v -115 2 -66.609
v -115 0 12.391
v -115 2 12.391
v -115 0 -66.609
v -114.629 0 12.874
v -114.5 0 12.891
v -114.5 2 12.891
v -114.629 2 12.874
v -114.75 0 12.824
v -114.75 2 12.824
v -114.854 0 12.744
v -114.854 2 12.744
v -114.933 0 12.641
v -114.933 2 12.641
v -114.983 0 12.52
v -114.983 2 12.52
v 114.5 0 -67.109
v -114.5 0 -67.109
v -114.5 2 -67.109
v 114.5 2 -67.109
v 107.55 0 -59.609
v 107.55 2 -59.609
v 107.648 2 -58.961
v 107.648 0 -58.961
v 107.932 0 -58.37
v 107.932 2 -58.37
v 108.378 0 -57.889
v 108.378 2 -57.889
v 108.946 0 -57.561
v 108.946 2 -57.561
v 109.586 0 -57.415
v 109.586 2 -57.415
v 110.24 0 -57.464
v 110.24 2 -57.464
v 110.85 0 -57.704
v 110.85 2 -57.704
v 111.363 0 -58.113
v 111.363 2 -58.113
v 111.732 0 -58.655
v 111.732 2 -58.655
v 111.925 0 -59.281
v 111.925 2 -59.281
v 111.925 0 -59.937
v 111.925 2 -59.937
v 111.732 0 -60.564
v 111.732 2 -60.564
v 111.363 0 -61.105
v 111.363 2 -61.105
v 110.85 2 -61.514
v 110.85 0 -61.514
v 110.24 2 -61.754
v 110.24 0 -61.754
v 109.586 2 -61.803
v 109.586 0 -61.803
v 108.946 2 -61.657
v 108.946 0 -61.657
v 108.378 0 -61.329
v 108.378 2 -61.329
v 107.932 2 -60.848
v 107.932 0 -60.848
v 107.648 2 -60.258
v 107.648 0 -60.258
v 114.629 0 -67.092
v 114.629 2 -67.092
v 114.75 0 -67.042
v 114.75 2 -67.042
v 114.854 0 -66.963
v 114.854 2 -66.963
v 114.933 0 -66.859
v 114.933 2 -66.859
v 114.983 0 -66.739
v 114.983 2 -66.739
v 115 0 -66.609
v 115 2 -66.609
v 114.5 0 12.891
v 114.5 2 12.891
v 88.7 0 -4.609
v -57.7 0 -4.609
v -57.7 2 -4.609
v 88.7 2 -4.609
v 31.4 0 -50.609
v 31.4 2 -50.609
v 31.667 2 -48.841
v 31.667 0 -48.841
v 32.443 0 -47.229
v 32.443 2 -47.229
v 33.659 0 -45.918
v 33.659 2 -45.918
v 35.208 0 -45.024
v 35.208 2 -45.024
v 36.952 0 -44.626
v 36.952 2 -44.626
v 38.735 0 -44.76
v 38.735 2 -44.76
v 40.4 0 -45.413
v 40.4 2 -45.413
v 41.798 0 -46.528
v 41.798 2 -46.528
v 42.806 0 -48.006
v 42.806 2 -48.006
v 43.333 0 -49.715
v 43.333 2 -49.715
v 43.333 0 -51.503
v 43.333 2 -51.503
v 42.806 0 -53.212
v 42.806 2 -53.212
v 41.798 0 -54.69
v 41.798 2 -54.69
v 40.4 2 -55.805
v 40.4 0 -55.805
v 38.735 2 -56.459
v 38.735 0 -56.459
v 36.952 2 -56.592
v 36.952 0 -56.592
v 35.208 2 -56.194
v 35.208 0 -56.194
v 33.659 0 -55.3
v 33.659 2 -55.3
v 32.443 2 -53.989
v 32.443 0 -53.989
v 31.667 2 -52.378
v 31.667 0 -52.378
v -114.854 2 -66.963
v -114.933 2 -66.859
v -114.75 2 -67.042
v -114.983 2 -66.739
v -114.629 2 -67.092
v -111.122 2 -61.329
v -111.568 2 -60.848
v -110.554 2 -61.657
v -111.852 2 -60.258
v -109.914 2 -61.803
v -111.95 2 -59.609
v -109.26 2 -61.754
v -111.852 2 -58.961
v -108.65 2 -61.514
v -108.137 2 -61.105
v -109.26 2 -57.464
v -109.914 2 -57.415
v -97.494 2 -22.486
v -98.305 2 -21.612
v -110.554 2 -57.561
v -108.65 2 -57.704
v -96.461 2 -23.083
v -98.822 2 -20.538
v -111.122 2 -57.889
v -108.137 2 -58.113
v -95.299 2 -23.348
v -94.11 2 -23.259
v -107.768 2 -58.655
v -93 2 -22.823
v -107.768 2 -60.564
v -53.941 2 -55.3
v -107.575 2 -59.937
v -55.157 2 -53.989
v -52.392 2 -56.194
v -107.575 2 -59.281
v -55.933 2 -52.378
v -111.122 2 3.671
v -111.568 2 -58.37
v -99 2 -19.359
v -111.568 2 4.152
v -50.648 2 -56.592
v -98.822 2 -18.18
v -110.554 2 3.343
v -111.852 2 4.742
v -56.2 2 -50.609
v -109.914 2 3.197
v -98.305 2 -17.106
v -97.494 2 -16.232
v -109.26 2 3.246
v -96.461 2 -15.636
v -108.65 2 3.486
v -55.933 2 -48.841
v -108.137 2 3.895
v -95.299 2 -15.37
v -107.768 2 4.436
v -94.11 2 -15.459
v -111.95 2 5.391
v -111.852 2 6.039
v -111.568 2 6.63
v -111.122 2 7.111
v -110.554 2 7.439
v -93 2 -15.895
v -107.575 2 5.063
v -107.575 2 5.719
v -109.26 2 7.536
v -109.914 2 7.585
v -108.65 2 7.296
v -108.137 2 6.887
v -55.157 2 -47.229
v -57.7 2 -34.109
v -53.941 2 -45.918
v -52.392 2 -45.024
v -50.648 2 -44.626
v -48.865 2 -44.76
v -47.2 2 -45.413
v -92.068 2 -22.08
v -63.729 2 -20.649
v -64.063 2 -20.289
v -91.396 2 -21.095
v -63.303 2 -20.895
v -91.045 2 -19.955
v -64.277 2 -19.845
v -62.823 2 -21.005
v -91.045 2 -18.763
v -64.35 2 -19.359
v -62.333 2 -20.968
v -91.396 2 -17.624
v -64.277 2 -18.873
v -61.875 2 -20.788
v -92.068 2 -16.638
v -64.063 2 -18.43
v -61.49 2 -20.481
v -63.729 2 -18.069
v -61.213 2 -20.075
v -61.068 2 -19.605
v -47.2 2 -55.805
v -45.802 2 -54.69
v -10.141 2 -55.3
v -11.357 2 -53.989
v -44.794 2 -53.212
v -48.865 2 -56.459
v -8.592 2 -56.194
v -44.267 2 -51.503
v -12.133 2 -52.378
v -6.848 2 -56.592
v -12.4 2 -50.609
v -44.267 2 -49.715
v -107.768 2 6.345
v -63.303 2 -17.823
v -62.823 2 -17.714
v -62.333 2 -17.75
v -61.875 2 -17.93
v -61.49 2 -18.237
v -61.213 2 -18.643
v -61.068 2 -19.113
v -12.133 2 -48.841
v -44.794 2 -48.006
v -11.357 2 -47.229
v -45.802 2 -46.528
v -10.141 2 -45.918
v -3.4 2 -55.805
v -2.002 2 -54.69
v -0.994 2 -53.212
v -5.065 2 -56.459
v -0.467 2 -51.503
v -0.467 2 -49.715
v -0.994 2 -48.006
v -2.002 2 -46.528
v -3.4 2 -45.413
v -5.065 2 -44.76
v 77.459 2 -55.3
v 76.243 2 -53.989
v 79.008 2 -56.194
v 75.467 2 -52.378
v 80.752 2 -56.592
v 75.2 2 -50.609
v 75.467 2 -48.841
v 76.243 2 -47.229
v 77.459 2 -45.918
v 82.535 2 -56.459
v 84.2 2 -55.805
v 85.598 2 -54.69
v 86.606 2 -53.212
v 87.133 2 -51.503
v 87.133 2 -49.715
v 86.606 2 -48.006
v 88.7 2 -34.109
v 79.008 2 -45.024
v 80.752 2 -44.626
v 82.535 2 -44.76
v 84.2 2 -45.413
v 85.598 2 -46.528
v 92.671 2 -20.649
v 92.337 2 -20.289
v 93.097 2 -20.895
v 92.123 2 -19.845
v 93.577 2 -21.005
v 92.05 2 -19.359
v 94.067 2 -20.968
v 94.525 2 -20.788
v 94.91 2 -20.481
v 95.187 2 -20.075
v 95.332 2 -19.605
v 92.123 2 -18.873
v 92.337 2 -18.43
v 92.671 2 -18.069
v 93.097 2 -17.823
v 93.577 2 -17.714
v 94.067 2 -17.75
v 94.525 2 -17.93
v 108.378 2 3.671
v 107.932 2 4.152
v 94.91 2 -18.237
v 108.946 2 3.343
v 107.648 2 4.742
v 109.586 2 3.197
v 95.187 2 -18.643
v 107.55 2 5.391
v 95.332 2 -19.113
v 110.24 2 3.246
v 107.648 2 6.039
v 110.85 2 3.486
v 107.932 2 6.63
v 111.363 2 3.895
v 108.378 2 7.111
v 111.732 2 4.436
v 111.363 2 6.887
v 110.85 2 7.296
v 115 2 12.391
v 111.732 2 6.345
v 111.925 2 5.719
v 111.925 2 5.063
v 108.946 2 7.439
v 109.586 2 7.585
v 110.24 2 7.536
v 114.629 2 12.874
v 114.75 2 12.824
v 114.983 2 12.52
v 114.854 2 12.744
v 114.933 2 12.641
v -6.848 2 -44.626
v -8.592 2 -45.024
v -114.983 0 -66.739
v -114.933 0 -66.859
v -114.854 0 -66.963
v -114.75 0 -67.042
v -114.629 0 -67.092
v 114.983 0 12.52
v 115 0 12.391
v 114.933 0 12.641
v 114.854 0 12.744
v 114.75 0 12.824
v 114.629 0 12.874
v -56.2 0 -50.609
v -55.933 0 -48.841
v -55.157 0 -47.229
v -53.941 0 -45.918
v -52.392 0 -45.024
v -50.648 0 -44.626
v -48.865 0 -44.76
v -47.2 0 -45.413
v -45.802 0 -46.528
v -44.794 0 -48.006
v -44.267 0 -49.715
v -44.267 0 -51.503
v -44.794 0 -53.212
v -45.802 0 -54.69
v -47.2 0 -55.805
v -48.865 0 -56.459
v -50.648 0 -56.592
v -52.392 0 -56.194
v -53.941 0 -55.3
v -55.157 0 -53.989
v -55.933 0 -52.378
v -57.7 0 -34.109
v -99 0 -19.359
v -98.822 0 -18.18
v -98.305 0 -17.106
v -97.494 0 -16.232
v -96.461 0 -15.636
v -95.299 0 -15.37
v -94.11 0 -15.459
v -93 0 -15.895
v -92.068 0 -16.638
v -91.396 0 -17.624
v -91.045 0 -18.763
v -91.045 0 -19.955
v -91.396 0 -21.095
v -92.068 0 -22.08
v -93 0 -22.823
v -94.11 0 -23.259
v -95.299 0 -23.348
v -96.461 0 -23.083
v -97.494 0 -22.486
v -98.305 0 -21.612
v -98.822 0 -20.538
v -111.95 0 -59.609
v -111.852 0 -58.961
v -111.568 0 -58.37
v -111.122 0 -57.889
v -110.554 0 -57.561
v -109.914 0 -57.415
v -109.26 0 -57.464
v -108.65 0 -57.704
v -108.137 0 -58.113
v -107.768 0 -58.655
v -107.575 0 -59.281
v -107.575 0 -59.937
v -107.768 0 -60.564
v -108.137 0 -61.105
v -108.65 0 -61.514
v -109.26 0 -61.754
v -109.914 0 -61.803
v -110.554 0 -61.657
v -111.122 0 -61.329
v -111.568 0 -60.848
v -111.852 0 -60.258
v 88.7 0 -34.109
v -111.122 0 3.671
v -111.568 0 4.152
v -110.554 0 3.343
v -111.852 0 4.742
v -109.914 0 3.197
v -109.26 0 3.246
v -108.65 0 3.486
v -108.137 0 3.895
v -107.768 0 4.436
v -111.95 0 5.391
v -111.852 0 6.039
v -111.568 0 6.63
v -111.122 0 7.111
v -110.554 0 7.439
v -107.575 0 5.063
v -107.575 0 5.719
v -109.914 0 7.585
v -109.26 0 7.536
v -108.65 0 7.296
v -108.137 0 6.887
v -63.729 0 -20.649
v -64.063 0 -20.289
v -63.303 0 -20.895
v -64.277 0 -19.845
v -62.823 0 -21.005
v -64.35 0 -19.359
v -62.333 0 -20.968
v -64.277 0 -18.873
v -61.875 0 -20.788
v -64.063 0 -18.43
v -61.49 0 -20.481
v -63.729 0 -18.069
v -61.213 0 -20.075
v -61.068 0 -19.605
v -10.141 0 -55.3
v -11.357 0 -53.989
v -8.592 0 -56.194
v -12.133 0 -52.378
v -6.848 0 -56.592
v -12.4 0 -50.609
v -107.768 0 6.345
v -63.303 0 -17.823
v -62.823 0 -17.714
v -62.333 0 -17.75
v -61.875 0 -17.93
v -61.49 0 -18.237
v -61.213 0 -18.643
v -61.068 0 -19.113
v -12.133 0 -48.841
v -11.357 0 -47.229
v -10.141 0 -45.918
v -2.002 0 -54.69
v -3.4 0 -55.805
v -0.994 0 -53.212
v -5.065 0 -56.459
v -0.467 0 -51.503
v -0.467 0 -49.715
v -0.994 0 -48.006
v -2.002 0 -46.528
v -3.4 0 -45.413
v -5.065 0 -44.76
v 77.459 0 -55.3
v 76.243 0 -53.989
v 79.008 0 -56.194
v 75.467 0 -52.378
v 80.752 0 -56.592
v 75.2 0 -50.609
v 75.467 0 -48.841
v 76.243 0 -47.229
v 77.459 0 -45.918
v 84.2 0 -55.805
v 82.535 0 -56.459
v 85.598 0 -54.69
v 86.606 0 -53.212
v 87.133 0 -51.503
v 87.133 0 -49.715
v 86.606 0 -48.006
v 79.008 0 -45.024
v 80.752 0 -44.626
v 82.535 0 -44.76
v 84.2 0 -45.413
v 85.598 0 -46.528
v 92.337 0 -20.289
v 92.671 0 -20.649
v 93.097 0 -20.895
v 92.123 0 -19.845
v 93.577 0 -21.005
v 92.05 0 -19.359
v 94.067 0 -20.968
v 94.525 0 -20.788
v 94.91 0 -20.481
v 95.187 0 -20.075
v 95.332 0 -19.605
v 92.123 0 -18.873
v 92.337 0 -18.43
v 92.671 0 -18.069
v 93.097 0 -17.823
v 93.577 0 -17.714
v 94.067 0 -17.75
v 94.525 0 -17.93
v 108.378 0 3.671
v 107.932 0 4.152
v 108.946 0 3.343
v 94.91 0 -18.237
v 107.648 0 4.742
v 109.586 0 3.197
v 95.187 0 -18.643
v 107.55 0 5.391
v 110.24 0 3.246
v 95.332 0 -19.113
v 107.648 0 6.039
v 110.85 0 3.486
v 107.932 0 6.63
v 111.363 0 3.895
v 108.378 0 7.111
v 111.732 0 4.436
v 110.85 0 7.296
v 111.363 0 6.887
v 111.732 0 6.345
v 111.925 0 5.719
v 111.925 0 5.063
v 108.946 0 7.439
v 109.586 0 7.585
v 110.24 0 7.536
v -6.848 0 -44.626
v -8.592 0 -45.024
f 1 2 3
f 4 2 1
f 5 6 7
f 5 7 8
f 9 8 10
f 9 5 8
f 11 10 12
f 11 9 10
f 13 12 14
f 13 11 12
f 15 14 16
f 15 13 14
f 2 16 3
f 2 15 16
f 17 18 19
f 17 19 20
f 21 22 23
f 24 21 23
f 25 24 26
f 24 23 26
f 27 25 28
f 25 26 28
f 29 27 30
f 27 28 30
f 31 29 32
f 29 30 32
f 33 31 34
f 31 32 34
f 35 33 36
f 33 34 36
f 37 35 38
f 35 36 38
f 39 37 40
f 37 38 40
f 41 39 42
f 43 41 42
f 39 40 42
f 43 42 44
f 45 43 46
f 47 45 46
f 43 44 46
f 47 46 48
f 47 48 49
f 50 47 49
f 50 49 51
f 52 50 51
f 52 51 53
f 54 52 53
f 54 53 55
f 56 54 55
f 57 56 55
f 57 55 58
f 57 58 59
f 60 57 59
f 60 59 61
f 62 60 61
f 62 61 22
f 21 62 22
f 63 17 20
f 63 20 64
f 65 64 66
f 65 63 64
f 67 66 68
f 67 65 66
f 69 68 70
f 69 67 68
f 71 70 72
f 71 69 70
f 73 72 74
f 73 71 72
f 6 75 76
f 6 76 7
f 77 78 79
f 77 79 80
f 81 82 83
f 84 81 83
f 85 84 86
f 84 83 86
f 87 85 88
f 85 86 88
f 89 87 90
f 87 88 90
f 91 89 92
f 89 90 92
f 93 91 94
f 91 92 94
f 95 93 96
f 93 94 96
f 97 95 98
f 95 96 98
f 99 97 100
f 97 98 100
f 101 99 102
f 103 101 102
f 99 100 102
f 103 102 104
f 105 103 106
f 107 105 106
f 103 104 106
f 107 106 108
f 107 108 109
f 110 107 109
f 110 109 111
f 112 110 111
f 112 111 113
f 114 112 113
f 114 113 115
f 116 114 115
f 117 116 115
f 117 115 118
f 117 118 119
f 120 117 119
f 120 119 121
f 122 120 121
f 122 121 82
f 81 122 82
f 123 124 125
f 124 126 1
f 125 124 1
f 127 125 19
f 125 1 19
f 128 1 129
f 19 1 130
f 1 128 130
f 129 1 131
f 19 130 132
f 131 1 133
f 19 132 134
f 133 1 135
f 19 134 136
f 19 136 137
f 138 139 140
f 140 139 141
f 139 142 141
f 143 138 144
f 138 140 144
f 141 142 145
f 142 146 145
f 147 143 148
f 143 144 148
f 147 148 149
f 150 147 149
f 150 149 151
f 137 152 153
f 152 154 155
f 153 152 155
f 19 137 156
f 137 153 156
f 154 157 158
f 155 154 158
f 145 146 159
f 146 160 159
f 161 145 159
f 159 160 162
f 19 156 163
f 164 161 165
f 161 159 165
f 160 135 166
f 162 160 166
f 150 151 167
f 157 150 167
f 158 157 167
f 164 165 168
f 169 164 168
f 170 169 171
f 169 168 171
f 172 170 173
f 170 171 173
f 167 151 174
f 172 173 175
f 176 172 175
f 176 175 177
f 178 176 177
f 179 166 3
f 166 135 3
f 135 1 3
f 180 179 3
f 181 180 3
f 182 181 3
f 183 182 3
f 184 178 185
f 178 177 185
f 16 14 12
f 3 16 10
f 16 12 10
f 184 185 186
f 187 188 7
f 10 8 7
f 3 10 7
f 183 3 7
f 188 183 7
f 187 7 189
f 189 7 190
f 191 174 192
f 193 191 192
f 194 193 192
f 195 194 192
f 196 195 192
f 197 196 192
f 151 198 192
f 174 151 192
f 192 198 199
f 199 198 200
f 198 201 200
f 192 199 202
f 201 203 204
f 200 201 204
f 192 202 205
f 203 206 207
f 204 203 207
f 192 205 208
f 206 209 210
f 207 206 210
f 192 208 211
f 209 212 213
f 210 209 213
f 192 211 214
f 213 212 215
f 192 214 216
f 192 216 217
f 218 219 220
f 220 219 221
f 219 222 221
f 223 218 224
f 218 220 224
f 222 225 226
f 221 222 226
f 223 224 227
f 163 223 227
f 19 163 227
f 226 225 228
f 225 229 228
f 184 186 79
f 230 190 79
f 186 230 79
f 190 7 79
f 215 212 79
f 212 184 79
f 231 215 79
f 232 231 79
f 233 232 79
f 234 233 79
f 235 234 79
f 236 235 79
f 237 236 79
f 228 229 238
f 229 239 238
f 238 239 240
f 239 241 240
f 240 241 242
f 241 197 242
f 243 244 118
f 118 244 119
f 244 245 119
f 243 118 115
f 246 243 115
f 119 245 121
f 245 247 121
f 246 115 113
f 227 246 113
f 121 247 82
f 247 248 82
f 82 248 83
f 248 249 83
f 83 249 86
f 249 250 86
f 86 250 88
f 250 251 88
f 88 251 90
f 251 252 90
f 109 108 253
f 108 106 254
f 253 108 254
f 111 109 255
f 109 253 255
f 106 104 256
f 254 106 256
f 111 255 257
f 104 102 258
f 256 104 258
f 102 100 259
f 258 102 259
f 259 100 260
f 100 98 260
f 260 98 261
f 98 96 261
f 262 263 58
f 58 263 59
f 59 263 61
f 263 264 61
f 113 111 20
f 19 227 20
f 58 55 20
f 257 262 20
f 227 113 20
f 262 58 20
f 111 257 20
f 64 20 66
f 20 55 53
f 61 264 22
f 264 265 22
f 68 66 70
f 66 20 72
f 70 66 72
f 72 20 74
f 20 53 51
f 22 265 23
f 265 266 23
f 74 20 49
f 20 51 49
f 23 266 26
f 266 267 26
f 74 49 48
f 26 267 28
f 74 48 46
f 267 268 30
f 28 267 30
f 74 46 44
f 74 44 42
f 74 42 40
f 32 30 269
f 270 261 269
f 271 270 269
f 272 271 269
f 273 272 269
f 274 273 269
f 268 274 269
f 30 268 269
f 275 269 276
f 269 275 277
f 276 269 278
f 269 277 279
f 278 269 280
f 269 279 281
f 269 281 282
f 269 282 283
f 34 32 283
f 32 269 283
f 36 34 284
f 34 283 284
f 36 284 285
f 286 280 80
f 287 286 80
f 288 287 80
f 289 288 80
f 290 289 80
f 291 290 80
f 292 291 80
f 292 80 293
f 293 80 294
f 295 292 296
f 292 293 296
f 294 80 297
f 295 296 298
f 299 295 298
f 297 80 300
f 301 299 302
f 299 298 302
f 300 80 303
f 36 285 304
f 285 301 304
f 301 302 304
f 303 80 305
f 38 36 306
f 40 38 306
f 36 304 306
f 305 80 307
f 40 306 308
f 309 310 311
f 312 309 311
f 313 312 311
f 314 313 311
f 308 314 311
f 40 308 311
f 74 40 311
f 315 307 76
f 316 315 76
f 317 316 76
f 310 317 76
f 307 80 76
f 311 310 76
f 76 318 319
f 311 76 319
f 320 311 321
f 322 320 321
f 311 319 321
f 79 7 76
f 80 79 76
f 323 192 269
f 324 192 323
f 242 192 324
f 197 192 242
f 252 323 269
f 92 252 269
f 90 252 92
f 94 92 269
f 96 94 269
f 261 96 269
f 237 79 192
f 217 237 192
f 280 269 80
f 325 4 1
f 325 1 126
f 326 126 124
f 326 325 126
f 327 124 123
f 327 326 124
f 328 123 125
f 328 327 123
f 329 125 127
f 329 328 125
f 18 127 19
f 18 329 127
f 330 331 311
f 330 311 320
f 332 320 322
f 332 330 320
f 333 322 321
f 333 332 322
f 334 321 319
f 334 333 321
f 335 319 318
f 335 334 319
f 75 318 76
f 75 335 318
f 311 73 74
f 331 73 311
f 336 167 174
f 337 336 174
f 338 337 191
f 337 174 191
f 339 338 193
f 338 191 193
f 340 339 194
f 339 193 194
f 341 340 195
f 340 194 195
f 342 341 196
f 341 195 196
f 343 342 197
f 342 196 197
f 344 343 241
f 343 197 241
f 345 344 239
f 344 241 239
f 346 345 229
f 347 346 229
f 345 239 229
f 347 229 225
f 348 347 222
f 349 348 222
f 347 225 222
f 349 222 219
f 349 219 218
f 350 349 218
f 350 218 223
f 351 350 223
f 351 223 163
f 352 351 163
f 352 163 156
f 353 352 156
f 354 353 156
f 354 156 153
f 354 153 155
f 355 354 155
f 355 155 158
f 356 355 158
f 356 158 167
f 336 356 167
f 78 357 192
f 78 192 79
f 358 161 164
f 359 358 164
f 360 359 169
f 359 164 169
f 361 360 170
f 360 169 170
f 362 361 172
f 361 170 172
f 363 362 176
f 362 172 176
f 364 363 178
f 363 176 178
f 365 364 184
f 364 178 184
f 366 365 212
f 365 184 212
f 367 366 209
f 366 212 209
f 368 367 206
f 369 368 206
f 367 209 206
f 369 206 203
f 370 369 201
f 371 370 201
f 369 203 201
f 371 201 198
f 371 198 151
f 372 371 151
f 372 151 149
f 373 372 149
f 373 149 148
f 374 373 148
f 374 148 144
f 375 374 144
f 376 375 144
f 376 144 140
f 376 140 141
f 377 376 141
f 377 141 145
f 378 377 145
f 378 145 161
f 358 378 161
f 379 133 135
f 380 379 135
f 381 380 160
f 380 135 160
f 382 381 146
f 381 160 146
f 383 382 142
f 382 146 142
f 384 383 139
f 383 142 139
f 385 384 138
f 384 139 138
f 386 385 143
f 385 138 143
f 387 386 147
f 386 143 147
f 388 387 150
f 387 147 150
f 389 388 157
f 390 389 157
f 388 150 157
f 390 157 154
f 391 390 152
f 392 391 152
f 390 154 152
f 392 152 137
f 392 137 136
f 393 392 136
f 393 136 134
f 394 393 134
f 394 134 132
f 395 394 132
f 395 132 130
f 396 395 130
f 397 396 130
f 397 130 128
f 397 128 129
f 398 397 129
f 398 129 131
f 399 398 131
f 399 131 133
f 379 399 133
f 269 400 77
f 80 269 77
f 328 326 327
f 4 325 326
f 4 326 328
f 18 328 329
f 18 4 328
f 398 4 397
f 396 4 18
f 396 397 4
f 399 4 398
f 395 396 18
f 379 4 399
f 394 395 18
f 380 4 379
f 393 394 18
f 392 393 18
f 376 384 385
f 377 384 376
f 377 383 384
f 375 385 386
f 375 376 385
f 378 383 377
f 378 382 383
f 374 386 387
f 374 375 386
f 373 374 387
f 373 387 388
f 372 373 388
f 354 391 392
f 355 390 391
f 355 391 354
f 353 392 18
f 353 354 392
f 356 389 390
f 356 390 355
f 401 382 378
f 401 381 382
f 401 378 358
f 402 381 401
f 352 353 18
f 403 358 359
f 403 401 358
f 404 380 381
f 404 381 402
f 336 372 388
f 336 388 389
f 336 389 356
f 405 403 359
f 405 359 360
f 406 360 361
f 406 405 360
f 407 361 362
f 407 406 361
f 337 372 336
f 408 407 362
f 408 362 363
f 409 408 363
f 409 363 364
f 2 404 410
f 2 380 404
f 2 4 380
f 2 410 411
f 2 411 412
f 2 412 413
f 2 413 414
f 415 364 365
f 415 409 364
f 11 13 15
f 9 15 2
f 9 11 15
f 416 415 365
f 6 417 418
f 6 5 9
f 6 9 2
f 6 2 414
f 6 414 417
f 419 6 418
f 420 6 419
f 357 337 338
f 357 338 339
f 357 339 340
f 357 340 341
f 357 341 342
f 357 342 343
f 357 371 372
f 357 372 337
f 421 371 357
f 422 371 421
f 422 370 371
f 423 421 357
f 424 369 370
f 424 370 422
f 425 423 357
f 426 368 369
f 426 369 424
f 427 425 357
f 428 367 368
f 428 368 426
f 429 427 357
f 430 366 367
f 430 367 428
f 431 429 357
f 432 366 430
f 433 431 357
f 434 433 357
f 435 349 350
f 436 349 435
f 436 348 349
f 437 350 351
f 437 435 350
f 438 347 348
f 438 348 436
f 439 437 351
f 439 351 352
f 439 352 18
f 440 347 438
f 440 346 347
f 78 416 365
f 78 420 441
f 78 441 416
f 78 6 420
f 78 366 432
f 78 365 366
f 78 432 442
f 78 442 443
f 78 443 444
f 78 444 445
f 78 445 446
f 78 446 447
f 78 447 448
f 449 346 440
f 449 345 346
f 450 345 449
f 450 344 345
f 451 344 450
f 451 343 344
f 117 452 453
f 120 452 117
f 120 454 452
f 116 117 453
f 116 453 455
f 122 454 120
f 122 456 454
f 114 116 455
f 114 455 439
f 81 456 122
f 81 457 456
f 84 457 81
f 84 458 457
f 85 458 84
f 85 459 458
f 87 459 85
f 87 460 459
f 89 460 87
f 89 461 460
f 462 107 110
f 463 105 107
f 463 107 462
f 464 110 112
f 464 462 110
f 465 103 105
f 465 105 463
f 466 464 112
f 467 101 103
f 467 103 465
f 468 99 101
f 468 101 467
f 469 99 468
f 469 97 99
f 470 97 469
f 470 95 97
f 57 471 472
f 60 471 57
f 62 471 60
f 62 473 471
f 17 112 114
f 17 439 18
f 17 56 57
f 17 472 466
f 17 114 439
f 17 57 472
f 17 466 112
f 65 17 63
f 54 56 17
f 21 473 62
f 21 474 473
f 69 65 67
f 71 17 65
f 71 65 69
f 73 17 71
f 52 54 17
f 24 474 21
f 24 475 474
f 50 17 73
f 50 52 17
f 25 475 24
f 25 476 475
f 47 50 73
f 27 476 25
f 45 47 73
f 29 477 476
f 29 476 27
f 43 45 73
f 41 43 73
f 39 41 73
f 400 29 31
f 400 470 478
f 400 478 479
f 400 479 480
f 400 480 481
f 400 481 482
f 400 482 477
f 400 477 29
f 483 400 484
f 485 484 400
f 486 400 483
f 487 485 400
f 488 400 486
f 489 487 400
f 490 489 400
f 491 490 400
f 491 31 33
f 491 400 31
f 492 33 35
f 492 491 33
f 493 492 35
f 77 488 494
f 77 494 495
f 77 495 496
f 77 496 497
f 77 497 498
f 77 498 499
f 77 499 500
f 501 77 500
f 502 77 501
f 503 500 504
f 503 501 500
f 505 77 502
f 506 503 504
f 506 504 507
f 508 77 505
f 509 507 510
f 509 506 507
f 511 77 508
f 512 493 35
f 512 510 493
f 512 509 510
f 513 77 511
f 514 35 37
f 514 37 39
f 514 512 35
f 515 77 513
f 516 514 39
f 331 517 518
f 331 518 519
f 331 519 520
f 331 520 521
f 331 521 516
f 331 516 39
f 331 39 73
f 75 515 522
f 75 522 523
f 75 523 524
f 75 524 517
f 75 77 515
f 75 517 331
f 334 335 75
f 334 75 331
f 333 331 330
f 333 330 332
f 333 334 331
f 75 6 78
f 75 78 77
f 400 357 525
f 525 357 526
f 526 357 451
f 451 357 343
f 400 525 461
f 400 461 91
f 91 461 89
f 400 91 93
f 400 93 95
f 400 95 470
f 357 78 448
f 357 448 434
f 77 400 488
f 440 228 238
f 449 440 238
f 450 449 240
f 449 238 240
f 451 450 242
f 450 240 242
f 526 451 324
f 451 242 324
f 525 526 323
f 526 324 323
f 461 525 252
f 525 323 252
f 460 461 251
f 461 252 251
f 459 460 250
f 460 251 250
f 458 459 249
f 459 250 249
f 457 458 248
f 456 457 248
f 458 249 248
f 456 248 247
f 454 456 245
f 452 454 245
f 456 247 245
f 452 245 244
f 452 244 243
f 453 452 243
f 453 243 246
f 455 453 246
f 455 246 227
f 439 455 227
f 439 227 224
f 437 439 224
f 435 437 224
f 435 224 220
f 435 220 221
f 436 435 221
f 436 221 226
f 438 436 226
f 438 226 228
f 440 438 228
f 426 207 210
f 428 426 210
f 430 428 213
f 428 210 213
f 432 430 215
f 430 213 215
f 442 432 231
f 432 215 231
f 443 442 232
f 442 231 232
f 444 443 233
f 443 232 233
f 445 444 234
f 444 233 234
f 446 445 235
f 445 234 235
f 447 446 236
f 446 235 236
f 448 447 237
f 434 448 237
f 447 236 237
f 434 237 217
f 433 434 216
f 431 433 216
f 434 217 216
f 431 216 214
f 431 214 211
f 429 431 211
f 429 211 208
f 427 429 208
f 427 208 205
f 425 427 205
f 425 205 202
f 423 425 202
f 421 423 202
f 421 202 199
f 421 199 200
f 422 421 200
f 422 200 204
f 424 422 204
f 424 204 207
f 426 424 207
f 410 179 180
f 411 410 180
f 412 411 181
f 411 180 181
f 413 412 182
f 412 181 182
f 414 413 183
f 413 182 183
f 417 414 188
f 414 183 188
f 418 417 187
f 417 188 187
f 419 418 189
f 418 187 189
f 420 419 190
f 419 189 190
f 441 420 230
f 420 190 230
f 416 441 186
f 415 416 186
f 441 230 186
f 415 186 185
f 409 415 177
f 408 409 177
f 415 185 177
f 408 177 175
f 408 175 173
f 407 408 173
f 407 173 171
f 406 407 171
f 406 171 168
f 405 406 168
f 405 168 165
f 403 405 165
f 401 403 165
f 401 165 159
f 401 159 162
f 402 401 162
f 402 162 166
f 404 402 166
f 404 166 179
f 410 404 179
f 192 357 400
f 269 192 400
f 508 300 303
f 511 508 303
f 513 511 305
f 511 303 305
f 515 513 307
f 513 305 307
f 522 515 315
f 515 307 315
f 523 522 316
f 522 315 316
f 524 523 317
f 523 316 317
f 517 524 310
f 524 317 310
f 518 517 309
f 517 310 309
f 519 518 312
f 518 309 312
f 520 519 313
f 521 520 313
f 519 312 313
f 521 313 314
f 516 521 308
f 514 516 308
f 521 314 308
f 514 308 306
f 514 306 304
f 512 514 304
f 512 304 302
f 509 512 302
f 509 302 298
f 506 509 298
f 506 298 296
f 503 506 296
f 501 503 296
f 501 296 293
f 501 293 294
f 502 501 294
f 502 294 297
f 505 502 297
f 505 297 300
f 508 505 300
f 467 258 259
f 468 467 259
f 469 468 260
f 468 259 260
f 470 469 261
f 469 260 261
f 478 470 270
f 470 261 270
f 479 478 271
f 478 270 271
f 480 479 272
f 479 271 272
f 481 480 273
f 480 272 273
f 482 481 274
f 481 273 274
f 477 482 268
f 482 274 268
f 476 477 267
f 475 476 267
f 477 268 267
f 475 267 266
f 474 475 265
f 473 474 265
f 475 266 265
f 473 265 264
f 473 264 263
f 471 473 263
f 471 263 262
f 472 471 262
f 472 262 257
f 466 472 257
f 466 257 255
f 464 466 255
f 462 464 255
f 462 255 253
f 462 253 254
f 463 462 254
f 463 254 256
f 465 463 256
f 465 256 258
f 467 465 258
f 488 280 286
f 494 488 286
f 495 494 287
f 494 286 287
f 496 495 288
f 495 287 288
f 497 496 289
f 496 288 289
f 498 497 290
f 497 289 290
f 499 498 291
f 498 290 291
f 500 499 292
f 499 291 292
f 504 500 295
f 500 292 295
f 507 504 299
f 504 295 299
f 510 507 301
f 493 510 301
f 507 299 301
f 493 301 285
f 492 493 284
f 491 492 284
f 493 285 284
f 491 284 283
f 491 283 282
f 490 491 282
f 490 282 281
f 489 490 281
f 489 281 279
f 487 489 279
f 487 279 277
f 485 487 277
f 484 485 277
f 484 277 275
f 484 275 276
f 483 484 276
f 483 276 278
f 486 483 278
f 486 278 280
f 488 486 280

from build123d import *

# Parameters (mm, degrees)
F0_W     = 146.4
F0_H     = 29.5
F1_DEPTH = 2
F2_D     = 4.4
F3_D     = 3.3
F4_D     = 8
F5_D     = 12


with BuildPart() as f1:
    # F0 (on Front) → F1 (new body)
    with BuildSketch(Plane.XZ):
        with BuildLine():
            Line((114.5, 12.8908843005), (-114.5, 12.8908843005))
            ThreePointArc((-114.5, 12.8908843005), (-114.8535533906, 12.7444376911), (-115, 12.3908843005))
            Line((-115, 12.3908843005), (-115, -66.6091156995))
            ThreePointArc((-115, -66.6091156995), (-114.8535533906, -66.9626690901), (-114.5, -67.1091156995))
            Line((-114.5, -67.1091156995), (114.5, -67.1091156995))
            ThreePointArc((114.5, -67.1091156995), (114.8535533906, -66.9626690901), (115, -66.6091156995))
            Line((115, -66.6091156995), (115, 12.3908843005))
            ThreePointArc((115, 12.3908843005), (114.8535533906, 12.7444376911), (114.5, 12.8908843005))
        make_face()
        with Locations((15.5, -19.3591156995)):
            Rectangle(F0_W, F0_H, mode=Mode.SUBTRACT)
    extrude(amount=-F1_DEPTH)

    # F2 (through all)
    with Locations(Plane.XZ):
        with Locations((-109.75, 5.3908843005), (109.75, 5.3908843005), (109.75, -59.6091156995), (-109.75, -59.6091156995)):
            Hole(F2_D / 2)

    # F3 (through all)
    with Locations(Plane.XZ):
        with Locations((-62.7, -19.3591156995), (93.7, -19.3591156995)):
            Hole(F3_D / 2)

    # F4 (through all)
    with Locations(Plane.XZ):
        with Locations((-95, -19.3591156995)):
            Hole(F4_D / 2)

    # F5 (through all)
    with Locations(Plane.XZ):
        with Locations((-50.2, -50.6091156995), (-6.4, -50.6091156995), (37.4, -50.6091156995), (81.2, -50.6091156995)):
            Hole(F5_D / 2)


solid = f1.part
